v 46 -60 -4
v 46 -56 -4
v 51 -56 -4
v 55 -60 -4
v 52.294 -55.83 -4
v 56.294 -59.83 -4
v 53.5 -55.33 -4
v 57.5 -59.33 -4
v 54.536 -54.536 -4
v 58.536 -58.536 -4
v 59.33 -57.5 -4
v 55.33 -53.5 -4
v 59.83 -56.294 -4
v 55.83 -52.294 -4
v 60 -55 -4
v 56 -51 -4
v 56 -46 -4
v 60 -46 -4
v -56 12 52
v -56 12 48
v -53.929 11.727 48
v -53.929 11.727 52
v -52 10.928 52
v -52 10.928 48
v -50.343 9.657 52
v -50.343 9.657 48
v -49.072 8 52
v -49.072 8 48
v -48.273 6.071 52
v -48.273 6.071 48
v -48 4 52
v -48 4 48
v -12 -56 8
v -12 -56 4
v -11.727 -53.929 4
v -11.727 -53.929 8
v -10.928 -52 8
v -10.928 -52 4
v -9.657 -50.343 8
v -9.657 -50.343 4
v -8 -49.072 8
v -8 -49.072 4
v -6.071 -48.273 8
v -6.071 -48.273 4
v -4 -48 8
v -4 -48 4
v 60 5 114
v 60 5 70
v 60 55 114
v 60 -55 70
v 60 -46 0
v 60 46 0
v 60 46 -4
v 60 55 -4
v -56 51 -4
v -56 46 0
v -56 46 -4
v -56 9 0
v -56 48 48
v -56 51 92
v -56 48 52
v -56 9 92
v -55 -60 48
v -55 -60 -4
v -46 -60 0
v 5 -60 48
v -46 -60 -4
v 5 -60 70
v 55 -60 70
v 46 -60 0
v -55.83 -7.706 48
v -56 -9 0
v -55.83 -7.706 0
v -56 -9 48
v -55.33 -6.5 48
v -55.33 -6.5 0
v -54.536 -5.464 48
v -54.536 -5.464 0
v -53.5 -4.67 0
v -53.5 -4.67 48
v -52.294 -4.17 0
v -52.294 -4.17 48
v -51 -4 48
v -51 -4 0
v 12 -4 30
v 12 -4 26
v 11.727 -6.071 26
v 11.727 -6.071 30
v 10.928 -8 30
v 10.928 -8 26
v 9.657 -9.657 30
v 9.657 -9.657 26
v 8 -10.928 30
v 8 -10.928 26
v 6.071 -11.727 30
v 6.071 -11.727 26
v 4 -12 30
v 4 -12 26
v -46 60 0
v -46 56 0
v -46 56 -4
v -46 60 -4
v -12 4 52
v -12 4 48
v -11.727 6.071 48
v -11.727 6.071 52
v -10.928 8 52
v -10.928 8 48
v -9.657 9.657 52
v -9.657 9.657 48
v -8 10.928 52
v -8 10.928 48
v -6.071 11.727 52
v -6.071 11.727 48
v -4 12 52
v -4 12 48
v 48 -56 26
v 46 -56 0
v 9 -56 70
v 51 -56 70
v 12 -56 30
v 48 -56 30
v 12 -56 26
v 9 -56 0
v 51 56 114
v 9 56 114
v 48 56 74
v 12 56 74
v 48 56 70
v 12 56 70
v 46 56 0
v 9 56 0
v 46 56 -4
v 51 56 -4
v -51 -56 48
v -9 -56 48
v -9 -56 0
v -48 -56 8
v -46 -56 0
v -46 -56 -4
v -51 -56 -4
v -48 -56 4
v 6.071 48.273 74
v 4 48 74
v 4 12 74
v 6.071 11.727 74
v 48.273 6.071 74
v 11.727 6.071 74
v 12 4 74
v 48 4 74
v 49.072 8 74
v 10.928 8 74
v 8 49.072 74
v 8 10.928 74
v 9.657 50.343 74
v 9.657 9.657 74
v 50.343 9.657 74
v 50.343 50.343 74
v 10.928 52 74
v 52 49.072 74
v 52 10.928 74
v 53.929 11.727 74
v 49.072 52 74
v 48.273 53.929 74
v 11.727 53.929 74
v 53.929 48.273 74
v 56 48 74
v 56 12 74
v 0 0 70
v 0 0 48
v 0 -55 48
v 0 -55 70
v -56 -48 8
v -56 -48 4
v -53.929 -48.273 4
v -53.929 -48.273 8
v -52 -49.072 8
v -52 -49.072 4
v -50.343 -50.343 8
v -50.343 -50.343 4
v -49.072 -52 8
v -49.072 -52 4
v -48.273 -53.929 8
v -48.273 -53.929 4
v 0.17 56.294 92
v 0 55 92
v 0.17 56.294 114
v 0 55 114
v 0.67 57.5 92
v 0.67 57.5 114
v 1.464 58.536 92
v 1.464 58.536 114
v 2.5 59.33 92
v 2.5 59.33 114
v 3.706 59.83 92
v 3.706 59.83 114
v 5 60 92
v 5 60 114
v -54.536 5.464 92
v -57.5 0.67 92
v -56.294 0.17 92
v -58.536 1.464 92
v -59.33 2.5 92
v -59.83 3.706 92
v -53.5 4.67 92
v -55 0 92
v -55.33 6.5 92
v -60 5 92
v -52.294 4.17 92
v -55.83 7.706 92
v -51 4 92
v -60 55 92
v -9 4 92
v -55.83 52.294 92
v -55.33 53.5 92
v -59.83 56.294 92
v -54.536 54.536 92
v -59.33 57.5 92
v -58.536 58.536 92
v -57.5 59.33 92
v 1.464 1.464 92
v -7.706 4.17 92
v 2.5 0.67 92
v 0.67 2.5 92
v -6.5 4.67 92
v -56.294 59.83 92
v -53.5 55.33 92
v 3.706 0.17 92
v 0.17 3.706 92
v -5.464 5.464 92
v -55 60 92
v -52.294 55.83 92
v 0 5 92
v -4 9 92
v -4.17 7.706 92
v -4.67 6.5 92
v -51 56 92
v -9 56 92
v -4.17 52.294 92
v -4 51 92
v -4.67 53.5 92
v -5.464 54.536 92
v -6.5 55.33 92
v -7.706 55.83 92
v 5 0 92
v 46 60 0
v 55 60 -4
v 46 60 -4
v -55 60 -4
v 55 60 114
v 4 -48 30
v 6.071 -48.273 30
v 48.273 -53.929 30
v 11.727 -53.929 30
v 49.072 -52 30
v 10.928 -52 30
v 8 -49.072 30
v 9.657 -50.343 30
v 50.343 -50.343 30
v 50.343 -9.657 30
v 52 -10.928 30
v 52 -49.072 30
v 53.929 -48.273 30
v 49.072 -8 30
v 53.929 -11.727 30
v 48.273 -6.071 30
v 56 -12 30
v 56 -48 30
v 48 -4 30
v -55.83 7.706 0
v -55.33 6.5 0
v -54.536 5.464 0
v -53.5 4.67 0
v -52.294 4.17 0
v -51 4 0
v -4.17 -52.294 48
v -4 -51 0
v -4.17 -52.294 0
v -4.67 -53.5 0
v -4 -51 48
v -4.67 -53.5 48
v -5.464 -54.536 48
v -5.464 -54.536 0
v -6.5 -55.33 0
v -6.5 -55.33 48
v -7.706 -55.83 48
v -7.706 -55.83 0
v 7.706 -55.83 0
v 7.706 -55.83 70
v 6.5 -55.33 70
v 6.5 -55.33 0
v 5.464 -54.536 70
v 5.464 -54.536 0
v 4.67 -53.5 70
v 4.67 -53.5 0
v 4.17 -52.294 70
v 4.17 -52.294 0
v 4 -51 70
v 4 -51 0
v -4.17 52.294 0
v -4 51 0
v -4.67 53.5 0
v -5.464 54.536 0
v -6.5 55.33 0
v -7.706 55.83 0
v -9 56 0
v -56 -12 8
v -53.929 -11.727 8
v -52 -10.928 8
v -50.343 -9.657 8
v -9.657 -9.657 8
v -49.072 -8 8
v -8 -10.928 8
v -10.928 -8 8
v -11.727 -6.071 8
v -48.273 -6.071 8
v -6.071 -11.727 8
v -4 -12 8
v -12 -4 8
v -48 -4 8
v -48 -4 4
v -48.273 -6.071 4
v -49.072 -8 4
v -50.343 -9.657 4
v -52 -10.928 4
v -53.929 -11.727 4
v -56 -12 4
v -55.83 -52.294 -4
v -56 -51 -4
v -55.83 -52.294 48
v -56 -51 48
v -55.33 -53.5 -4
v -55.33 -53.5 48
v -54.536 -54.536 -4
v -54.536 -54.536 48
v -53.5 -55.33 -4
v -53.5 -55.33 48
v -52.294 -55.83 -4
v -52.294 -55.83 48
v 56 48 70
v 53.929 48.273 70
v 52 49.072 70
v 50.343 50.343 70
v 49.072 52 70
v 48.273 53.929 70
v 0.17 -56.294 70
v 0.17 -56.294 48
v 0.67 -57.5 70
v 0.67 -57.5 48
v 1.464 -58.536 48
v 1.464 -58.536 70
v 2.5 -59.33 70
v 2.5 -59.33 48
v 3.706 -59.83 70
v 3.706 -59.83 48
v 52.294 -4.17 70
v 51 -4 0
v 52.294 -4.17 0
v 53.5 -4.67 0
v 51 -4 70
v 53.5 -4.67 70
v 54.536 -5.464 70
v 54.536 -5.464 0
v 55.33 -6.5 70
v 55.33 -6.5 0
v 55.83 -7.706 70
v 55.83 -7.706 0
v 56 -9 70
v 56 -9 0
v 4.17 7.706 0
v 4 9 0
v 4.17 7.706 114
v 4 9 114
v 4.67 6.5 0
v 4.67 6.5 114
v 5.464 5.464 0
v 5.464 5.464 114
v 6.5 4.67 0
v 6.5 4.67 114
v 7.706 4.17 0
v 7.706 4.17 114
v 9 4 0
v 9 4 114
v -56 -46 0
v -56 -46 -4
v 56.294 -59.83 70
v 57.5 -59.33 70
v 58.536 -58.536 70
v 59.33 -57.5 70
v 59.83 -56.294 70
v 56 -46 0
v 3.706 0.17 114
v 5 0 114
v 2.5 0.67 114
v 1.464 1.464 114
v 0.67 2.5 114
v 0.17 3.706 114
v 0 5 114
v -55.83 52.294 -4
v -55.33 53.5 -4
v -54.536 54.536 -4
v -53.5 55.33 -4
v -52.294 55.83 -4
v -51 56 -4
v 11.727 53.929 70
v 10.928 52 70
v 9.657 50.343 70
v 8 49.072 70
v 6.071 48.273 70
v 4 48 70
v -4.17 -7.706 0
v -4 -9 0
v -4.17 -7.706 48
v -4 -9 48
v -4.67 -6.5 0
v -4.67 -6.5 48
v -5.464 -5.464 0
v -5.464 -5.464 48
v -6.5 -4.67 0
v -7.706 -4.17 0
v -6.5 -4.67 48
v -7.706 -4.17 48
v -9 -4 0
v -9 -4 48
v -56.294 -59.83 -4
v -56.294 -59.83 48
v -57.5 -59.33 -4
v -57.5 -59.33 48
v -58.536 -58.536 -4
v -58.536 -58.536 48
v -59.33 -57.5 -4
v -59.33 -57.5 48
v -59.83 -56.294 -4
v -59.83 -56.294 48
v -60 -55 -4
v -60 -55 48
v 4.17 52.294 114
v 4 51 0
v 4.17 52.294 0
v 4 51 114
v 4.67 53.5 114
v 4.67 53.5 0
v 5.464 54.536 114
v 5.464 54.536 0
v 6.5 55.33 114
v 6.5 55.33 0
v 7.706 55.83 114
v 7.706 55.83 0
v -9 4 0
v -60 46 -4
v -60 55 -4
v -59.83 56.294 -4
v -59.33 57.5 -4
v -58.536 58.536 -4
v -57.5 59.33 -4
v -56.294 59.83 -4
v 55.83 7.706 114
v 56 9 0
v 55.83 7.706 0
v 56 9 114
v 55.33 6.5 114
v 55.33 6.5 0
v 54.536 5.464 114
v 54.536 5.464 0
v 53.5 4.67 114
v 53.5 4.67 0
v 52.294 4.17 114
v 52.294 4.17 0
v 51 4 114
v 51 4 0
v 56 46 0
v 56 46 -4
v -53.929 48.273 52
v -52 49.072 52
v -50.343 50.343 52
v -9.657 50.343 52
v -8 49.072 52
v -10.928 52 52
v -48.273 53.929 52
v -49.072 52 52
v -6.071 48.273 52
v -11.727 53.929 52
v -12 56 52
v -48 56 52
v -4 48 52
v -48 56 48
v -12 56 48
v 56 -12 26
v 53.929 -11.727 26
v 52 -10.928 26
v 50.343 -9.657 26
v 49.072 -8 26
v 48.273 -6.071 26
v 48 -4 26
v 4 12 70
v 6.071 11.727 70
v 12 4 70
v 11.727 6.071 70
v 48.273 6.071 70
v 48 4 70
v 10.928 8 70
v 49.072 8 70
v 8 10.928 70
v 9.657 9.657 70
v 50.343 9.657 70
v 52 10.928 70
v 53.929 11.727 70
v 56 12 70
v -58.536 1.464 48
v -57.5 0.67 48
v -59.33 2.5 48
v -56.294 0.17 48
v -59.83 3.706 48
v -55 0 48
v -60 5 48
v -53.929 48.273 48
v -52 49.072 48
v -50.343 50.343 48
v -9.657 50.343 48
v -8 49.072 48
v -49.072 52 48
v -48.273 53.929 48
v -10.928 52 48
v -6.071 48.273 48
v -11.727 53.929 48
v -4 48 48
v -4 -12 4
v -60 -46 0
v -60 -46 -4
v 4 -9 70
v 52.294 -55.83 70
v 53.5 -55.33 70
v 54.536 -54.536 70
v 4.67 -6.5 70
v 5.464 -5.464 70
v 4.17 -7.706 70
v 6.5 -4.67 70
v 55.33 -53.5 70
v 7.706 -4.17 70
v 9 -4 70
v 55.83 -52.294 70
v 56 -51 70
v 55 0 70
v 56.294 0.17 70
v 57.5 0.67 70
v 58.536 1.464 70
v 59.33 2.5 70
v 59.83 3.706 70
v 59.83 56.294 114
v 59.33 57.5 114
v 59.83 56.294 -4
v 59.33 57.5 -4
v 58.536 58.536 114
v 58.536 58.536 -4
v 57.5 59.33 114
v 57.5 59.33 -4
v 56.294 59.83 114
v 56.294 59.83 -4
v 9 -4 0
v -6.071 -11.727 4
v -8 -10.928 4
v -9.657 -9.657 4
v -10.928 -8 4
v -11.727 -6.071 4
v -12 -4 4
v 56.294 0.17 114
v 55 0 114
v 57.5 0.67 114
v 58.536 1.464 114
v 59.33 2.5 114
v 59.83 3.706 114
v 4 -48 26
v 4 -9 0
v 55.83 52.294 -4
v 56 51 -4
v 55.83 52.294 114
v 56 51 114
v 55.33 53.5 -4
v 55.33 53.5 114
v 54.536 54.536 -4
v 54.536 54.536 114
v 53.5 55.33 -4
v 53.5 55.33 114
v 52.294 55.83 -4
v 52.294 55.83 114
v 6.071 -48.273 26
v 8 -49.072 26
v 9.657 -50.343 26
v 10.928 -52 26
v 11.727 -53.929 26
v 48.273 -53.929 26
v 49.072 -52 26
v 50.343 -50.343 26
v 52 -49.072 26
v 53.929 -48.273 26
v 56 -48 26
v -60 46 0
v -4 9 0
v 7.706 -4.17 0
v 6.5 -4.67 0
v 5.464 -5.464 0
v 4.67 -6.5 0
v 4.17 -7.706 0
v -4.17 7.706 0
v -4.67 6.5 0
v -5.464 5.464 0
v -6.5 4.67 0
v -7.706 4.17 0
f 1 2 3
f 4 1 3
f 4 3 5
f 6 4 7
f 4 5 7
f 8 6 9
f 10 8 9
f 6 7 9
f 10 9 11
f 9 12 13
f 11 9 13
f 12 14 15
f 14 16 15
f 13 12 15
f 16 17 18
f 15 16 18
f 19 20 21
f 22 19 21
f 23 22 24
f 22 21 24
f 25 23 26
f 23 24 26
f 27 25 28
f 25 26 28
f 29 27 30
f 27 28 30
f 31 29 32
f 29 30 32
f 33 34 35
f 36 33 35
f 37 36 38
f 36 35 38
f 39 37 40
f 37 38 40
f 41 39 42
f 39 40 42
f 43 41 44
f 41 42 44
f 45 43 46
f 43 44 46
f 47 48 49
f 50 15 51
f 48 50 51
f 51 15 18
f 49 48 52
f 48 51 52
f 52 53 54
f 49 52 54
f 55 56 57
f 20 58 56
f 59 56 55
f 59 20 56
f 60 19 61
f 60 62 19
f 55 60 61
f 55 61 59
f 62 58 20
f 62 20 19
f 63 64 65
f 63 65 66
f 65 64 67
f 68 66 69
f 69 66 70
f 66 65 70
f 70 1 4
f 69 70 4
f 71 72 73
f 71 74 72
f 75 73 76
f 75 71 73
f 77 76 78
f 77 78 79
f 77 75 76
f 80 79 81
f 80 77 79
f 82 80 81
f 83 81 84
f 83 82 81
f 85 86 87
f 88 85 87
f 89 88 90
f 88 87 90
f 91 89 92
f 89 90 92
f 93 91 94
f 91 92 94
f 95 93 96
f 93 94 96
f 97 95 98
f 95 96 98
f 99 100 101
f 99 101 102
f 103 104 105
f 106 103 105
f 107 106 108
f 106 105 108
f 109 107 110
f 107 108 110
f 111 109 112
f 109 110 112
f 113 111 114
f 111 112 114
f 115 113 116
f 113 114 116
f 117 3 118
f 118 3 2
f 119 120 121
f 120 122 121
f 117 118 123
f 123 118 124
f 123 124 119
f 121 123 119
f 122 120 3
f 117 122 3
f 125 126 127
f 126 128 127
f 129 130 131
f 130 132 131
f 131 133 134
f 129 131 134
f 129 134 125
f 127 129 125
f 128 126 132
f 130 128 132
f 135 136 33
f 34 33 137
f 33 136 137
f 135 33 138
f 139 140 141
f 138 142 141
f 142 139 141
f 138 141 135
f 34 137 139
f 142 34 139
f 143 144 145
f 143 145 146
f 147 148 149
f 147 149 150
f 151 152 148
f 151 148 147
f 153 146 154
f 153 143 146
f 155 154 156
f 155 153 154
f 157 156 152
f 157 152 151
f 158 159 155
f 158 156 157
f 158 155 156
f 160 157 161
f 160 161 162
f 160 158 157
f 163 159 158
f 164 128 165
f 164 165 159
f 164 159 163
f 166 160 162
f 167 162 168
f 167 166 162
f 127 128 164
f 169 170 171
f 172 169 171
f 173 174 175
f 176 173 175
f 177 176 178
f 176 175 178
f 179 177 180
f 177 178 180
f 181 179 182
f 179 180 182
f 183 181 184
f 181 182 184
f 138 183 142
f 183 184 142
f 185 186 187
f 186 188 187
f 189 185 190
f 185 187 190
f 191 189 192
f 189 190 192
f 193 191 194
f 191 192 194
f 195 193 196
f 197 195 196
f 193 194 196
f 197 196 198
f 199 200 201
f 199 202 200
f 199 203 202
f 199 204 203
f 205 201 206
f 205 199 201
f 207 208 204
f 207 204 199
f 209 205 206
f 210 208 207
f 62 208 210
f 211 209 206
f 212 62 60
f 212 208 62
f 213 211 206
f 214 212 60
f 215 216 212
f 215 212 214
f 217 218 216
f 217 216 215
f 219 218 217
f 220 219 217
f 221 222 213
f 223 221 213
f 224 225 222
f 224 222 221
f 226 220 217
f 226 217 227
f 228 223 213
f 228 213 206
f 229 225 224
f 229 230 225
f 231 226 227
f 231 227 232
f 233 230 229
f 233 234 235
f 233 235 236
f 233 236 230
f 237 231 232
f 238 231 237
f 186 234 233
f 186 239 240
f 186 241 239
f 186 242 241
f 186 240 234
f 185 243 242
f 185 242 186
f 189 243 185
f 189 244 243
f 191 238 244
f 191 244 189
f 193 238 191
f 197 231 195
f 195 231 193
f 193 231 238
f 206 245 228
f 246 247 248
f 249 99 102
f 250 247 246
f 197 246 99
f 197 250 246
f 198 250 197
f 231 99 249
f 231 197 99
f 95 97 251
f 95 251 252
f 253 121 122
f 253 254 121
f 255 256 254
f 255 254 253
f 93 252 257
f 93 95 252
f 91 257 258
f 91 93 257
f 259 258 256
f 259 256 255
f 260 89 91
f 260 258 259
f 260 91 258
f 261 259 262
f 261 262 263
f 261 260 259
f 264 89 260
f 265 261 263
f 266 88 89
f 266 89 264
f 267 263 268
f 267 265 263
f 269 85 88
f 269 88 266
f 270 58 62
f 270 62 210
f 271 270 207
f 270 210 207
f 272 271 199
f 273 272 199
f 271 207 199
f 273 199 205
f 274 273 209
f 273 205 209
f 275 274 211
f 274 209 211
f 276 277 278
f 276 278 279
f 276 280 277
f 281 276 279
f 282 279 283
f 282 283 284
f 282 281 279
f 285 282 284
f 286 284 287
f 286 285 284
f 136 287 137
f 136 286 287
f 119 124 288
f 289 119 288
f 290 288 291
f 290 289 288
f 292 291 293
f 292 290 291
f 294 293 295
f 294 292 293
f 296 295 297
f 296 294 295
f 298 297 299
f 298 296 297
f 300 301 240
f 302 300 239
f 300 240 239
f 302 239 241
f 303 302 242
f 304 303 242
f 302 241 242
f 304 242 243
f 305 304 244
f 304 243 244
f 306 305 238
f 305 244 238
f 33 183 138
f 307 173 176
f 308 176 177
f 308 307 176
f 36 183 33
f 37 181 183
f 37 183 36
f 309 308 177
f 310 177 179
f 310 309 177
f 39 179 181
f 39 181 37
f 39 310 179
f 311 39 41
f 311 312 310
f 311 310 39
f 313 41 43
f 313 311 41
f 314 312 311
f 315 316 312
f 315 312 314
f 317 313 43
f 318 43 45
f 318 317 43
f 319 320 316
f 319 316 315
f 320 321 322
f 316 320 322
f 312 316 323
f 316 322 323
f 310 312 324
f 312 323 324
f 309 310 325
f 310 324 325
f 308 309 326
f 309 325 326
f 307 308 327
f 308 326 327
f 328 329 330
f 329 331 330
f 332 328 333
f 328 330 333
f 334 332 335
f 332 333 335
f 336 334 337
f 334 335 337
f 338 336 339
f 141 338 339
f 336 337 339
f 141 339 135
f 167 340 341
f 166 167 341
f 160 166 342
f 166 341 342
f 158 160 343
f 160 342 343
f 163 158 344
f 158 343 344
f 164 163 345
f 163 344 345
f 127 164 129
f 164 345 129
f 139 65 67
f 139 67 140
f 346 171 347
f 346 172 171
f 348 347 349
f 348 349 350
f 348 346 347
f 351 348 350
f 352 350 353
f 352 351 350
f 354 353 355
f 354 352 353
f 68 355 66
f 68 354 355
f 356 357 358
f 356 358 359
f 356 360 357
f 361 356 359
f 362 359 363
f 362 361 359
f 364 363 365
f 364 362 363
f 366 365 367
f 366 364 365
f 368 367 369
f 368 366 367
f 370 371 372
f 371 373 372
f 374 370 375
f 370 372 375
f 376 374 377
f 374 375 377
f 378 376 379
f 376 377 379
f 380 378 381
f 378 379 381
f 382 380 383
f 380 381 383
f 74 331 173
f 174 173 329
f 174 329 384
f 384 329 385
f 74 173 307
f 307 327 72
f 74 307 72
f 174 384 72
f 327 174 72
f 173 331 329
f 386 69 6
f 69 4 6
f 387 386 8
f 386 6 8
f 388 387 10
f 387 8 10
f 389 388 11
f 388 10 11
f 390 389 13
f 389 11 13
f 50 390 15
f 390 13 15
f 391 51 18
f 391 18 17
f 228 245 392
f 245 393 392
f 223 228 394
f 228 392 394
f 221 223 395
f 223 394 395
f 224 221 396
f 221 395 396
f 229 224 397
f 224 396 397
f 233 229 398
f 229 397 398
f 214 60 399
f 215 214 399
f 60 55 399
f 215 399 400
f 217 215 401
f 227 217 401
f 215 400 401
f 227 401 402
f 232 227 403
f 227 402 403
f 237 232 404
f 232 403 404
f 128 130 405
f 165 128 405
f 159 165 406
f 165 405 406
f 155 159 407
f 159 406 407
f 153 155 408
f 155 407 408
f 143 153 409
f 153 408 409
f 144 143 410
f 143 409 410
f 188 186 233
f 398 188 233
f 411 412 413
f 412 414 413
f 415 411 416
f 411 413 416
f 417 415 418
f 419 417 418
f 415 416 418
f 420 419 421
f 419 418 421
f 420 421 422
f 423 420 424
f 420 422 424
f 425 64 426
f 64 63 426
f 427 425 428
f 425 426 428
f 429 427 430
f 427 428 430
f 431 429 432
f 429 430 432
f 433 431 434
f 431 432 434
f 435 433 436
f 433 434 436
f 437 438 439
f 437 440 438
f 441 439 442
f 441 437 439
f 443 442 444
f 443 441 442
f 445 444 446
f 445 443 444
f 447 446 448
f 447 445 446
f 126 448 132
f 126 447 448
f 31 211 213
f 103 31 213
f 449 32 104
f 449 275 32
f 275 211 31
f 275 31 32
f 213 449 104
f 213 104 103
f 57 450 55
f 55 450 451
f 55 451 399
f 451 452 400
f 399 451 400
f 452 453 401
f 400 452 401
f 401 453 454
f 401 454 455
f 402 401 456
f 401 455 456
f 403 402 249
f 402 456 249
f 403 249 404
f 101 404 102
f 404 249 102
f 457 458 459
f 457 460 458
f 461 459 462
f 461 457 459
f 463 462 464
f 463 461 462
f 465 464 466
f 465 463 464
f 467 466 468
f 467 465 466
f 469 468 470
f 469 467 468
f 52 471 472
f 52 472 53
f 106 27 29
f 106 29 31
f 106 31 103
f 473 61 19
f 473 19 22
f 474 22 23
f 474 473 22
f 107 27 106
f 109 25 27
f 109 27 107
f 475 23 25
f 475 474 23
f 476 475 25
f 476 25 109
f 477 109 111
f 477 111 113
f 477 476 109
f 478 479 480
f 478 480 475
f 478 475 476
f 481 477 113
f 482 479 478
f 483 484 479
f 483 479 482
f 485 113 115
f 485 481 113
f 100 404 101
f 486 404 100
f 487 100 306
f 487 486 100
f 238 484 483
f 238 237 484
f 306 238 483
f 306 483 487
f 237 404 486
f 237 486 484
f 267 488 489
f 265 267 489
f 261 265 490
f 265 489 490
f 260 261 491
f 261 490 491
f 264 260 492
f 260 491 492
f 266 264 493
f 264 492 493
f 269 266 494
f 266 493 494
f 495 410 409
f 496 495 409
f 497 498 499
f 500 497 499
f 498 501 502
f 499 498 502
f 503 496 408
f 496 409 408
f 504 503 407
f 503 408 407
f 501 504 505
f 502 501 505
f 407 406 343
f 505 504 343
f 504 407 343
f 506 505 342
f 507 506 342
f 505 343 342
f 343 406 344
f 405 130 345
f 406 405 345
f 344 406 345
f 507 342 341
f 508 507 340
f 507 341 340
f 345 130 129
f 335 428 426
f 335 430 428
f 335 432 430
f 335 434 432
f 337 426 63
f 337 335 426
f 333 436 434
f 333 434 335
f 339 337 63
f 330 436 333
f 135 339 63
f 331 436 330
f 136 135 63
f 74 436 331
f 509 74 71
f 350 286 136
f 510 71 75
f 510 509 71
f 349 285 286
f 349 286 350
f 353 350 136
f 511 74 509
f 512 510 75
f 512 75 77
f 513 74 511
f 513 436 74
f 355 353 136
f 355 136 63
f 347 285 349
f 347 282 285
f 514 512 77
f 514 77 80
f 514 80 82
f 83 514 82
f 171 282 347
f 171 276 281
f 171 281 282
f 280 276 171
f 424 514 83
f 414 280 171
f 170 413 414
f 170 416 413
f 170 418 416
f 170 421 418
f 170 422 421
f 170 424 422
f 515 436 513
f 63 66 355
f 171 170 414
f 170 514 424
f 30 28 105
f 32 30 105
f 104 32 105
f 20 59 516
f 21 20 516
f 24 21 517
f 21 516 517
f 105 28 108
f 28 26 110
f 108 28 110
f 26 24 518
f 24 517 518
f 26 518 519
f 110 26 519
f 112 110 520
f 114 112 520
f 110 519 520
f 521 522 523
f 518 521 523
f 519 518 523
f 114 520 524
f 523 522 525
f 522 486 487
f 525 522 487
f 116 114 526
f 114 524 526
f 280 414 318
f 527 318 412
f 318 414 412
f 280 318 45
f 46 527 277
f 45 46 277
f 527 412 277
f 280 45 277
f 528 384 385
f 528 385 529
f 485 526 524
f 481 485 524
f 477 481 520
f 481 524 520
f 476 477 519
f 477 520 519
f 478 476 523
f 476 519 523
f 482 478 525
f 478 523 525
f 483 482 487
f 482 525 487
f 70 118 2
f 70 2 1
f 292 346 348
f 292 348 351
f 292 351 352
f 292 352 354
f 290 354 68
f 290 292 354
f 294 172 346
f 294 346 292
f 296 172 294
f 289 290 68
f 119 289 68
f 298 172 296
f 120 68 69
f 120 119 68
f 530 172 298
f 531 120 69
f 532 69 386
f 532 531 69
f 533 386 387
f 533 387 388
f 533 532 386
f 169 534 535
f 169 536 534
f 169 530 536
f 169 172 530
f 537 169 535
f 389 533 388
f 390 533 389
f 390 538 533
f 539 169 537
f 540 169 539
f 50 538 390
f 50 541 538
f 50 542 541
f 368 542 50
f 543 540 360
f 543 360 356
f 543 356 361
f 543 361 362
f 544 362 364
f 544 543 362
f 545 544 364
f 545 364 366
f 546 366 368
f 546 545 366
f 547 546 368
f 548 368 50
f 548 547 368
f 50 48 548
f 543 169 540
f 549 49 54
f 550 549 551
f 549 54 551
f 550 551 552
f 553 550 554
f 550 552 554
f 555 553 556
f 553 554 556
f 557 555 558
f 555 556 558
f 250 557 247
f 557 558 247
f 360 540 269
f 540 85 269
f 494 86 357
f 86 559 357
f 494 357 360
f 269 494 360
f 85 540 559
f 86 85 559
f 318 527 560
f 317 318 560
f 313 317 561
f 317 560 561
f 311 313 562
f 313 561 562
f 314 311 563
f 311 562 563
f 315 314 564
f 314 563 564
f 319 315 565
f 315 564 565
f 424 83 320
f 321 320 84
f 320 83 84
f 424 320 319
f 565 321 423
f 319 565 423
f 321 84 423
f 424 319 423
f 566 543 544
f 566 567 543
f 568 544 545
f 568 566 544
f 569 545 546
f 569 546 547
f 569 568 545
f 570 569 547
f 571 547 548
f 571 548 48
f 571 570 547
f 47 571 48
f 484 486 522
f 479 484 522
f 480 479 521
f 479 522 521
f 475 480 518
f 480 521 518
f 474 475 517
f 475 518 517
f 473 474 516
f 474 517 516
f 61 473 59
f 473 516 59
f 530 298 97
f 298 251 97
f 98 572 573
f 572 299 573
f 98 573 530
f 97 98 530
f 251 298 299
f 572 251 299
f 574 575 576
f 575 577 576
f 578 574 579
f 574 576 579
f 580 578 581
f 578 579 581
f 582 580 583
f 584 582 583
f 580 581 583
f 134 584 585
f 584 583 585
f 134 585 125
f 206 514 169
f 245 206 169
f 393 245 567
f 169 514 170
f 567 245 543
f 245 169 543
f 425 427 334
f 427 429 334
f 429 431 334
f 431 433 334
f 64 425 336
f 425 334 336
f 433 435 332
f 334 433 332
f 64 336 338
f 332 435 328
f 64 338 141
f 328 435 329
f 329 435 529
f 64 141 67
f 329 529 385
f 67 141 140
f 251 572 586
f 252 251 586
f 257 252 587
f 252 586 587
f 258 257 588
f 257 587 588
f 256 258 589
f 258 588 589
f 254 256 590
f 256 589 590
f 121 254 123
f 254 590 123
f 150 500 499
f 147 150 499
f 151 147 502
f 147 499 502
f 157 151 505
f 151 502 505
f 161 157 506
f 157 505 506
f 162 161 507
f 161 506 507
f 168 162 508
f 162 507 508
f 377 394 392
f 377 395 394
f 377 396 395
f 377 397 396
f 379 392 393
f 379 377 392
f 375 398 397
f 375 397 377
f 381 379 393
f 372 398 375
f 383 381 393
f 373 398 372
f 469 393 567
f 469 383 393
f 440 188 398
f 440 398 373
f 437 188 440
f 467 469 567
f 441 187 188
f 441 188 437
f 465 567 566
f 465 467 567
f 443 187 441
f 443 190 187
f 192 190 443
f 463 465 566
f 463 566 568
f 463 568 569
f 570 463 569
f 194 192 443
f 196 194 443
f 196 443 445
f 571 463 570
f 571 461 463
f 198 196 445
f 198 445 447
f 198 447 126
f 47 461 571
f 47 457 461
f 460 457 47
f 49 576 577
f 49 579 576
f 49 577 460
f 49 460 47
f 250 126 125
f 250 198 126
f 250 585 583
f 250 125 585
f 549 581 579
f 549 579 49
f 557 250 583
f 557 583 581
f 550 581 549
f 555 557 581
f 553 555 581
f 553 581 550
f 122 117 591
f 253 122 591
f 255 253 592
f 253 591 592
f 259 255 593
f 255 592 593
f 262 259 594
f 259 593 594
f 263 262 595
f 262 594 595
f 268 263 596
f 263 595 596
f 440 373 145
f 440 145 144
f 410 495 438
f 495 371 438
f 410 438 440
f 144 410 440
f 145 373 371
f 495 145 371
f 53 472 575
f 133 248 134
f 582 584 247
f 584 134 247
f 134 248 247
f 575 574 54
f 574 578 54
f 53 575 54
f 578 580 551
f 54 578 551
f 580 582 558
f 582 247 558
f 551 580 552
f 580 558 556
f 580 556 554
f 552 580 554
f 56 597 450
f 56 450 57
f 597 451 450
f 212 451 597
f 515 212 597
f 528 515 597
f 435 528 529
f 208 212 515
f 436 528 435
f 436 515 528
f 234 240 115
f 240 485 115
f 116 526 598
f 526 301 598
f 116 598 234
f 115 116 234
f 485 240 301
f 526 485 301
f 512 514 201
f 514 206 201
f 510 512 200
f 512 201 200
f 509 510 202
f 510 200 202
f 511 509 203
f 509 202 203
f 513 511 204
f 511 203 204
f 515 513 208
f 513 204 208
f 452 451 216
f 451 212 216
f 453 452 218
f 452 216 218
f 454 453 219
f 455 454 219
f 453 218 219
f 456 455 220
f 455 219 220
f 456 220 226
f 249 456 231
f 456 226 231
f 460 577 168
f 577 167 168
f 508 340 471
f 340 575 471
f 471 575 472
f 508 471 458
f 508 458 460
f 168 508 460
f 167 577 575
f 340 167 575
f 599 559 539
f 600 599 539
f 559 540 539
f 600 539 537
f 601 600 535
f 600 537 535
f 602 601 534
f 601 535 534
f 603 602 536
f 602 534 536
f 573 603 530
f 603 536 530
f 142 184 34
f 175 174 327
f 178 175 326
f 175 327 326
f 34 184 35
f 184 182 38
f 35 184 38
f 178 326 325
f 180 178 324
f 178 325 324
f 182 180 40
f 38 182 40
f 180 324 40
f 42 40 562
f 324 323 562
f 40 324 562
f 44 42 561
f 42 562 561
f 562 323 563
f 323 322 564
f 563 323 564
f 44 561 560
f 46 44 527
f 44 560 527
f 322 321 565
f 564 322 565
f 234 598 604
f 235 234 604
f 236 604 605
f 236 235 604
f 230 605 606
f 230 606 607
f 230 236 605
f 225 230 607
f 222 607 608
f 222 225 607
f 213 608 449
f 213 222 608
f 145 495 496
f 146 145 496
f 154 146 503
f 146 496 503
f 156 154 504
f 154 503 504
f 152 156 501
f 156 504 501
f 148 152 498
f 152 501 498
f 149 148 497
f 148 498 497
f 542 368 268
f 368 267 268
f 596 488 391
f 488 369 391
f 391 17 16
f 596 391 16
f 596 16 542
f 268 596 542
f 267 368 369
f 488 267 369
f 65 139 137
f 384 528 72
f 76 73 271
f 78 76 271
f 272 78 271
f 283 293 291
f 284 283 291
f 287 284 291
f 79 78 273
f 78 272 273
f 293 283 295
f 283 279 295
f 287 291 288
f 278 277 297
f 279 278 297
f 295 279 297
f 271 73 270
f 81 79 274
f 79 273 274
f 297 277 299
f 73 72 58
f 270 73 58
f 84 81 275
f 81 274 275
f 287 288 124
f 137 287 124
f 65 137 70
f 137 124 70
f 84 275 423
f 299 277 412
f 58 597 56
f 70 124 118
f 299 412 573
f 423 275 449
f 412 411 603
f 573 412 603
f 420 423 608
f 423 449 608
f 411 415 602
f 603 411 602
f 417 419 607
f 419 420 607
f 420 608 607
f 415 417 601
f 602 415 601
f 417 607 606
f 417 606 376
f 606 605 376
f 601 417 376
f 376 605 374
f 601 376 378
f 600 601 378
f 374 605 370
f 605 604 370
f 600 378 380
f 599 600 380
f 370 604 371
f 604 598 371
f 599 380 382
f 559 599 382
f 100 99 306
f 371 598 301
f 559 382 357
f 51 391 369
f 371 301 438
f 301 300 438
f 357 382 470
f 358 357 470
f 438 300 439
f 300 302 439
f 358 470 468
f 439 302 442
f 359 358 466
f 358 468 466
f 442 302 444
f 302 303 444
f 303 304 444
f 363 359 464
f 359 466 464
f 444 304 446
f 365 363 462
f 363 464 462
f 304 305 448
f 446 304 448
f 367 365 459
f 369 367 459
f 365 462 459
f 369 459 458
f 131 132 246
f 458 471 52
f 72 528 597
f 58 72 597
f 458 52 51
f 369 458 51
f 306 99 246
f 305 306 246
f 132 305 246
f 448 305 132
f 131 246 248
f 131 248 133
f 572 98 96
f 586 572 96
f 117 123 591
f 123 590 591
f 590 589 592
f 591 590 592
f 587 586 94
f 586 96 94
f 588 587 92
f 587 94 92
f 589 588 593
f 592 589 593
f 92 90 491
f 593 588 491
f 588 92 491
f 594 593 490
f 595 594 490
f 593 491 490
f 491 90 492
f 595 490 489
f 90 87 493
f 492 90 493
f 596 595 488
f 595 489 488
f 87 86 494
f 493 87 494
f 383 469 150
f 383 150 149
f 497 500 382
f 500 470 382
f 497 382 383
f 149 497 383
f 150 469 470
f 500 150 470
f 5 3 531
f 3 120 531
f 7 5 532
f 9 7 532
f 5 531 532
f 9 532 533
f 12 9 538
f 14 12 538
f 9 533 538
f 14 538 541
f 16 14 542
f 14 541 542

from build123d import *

# Parameters (mm, degrees)
F0_W      = 4
F0_H      = 4
F1_DEPTH  = 48
F2_DEPTH  = 8
F3_DEPTH  = 70
F4_DEPTH  = 30
F0_H_2    = 23.163830772
F5_DEPTH  = 114
F6_DEPTH  = 74
F0_W_2    = 10.0586636961
F7_DEPTH  = 92
F8_DEPTH  = 52
F9_DEPTH  = 4
F10_DEPTH = 48
F11_DEPTH = 26
F12_DEPTH = 70
F13_DEPTH = 4
F14_R     = 5


with BuildPart() as f1:
    # F0 (on Top) → F1 (new body)
    with BuildSketch(Plane.XY):
        Polygon((-12, -4), (-4, -4), (-4, 0), (-56, 0), (-56, -4), (-48, -4), align=None)
        Polygon((-60, -56), (-56, -56), (-56, -48), (-56, -46), (-60, -46), align=None)
        Polygon((-4, -56), (0, -56), (0, -4), (-4, -4), (-4, -12), (-4, -48), align=None)
        with Locations((-2, -2)):
            Rectangle(F0_W, F0_H)
        Polygon((-60, 0), (-60, -46), (-56, -46), (-56, -16.2410065532), (-56, -12), (-56, -4), (-56, 0), align=None)
        Polygon((-46, -60), (0, -60), (0, -56), (-4, -56), (-12, -56), (-46, -56), align=None)
        Polygon((-56, -60), (-46, -60), (-46, -56), (-48, -56), (-56, -56), align=None)
        with Locations((-58, -58)):
            Rectangle(F0_W, F0_H)
    extrude(amount=F1_DEPTH)

    # F0 (on Top) → F2 (join)
    with BuildSketch(Plane.XY):
        with BuildLine():
            Line((-48, -56), (-46, -56))
            Line((-46, -56), (-12, -56))
            ThreePointArc((-12, -56), (-9.6568542495, -50.3431457505), (-4, -48))
            Line((-4, -48), (-4, -12))
            ThreePointArc((-4, -12), (-9.6568542495, -9.6568542495), (-12, -4))
            Line((-12, -4), (-48, -4))
            ThreePointArc((-48, -4), (-50.3431457505, -9.6568542495), (-56, -12))
            Line((-56, -12), (-56, -16.2410065532))
            Line((-56, -16.2410065532), (-56, -46))
            Line((-56, -46), (-56, -48))
            ThreePointArc((-56, -48), (-50.3431457505, -50.3431457505), (-48, -56))
        make_face()
    extrude(amount=F2_DEPTH)

    # F0 (on Top) → F3 (join)
    with BuildSketch(Plane.XY):
        Polygon((0, -4), (0, -56), (4, -56), (4, -48), (4, -12), (4, -4), align=None)
        with Locations((2, -2)):
            Rectangle(F0_W, F0_H)
        Polygon((56, -4), (56, 0), (4, 0), (4, -4), (12, -4), (48, -4), align=None)
        Polygon((56, -46), (60, -46), (60, 0), (56, 0), (56, -4), (56, -12), align=None)
        Polygon((0, -60), (46, -60), (46, -56), (12, -56), (4, -56), (0, -56), align=None)
        Polygon((56, -56), (60, -56), (60, -46), (56, -46), (56, -48), align=None)
        with Locations((58, -58)):
            Rectangle(F0_W, F0_H)
        Polygon((46, -60), (56, -60), (56, -56), (48, -56), (46, -56), align=None)
    extrude(amount=F3_DEPTH)

    # F0 (on Top) → F4 (join)
    with BuildSketch(Plane.XY):
        with BuildLine():
            Line((12, -56), (46, -56))
            Line((46, -56), (48, -56))
            ThreePointArc((48, -56), (50.3431457505, -50.3431457505), (56, -48))
            Line((56, -48), (56, -46))
            Line((56, -46), (56, -12))
            ThreePointArc((56, -12), (50.3431457505, -9.6568542495), (48, -4))
            Line((48, -4), (12, -4))
            ThreePointArc((12, -4), (9.6568542495, -9.6568542495), (4, -12))
            Line((4, -12), (4, -48))
            ThreePointArc((4, -48), (9.6568542495, -50.3431457505), (12, -56))
        make_face()
    extrude(amount=F4_DEPTH)

    # F0 (on Top) → F5 (join)
    with BuildSketch(Plane.XY):
        Polygon((0, 4), (4, 4), (4, 12), (4, 48), (4, 56), (0, 56), align=None)
        Polygon((0, 60), (0, 56), (4, 56), (12, 56), (46, 56), (46, 60), align=None)
        with Locations((58, 34.418084614)):
            Rectangle(F0_W, F0_H_2)
        Polygon((56, 0), (60, 0), (60, 22.836169228), (56, 22.836169228), (56, 12), (56, 4), align=None)
        Polygon((4, 0), (56, 0), (56, 4), (48, 4), (12, 4), (4, 4), align=None)
        with Locations((2, 2)):
            Rectangle(F0_W, F0_H)
        Polygon((48, 56), (56, 56), (56, 60), (46, 60), (46, 56), align=None)
        with Locations((58, 58)):
            Rectangle(F0_W, F0_H)
        Polygon((56, 46), (60, 46), (60, 56), (56, 56), (56, 48), align=None)
    extrude(amount=F5_DEPTH)

    # F0 (on Top) → F6 (join)
    with BuildSketch(Plane.XY):
        with BuildLine():
            Line((56, 12), (56, 22.836169228))
            Line((56, 22.836169228), (56, 46))
            Line((56, 46), (56, 48))
            ThreePointArc((56, 48), (50.3431457505, 50.3431457505), (48, 56))
            Line((48, 56), (46, 56))
            Line((46, 56), (12, 56))
            ThreePointArc((12, 56), (9.6568542495, 50.3431457505), (4, 48))
            Line((4, 48), (4, 12))
            ThreePointArc((4, 12), (9.6568542495, 9.6568542495), (12, 4))
            Line((12, 4), (48, 4))
            ThreePointArc((48, 4), (50.3431457505, 9.6568542495), (56, 12))
        make_face()
    extrude(amount=F6_DEPTH)

    # F0 (on Top) → F7 (join)
    with BuildSketch(Plane.XY):
        Polygon((-56, 0), (-4, 0), (-4, 4), (-12, 4), (-48, 4), (-56, 4), align=None)
        Polygon((-4, 4), (0, 4), (0, 56), (-4, 56), (-4, 48), (-4, 12), align=None)
        with Locations((-2, 2)):
            Rectangle(F0_W, F0_H)
        Polygon((-4, 56), (0, 56), (0, 60), (-35.9413363039, 60), (-35.9413363039, 56), (-12, 56), align=None)
        with Locations((-40.970668152, 58)):
            Rectangle(F0_W_2, F0_H)
        Polygon((-60, 0), (-56, 0), (-56, 4), (-56, 12), (-56, 46), (-60, 46), align=None)
        Polygon((-46, 56), (-46, 60), (-56, 60), (-56, 56), (-48, 56), align=None)
        with Locations((-58, 58)):
            Rectangle(F0_W, F0_H)
        Polygon((-60, 56), (-60, 46), (-56, 46), (-56, 48), (-56, 56), align=None)
    extrude(amount=F7_DEPTH)

    # F0 (on Top) → F8 (join)
    with BuildSketch(Plane.XY):
        with BuildLine():
            ThreePointArc((-12, 4), (-9.6568542495, 9.6568542495), (-4, 12))
            Line((-4, 12), (-4, 48))
            ThreePointArc((-4, 48), (-9.6568542495, 50.3431457505), (-12, 56))
            Line((-12, 56), (-35.9413363039, 56))
            Line((-35.9413363039, 56), (-46, 56))
            Line((-46, 56), (-48, 56))
            ThreePointArc((-48, 56), (-50.3431457505, 50.3431457505), (-56, 48))
            Line((-56, 48), (-56, 46))
            Line((-56, 46), (-56, 12))
            ThreePointArc((-56, 12), (-50.3431457505, 9.6568542495), (-48, 4))
            Line((-48, 4), (-12, 4))
        make_face()
    extrude(amount=F8_DEPTH)

    # F0 (on Top) → F9 (cut)
    with BuildSketch(Plane.XY):
        with BuildLine():
            Line((-48, -56), (-46, -56))
            Line((-46, -56), (-12, -56))
            ThreePointArc((-12, -56), (-9.6568542495, -50.3431457505), (-4, -48))
            Line((-4, -48), (-4, -12))
            ThreePointArc((-4, -12), (-9.6568542495, -9.6568542495), (-12, -4))
            Line((-12, -4), (-48, -4))
            ThreePointArc((-48, -4), (-50.3431457505, -9.6568542495), (-56, -12))
            Line((-56, -12), (-56, -16.2410065532))
            Line((-56, -16.2410065532), (-56, -46))
            Line((-56, -46), (-56, -48))
            ThreePointArc((-56, -48), (-50.3431457505, -50.3431457505), (-48, -56))
        make_face()
    extrude(amount=F9_DEPTH, mode=Mode.SUBTRACT)

    # F0 (on Top) → F10 (cut)
    with BuildSketch(Plane.XY):
        with BuildLine():
            ThreePointArc((-12, 4), (-9.6568542495, 9.6568542495), (-4, 12))
            Line((-4, 12), (-4, 48))
            ThreePointArc((-4, 48), (-9.6568542495, 50.3431457505), (-12, 56))
            Line((-12, 56), (-35.9413363039, 56))
            Line((-35.9413363039, 56), (-46, 56))
            Line((-46, 56), (-48, 56))
            ThreePointArc((-48, 56), (-50.3431457505, 50.3431457505), (-56, 48))
            Line((-56, 48), (-56, 46))
            Line((-56, 46), (-56, 12))
            ThreePointArc((-56, 12), (-50.3431457505, 9.6568542495), (-48, 4))
            Line((-48, 4), (-12, 4))
        make_face()
    extrude(amount=F10_DEPTH, mode=Mode.SUBTRACT)

    # F0 (on Top) → F11 (cut)
    with BuildSketch(Plane.XY):
        with BuildLine():
            Line((12, -56), (46, -56))
            Line((46, -56), (48, -56))
            ThreePointArc((48, -56), (50.3431457505, -50.3431457505), (56, -48))
            Line((56, -48), (56, -46))
            Line((56, -46), (56, -12))
            ThreePointArc((56, -12), (50.3431457505, -9.6568542495), (48, -4))
            Line((48, -4), (12, -4))
            ThreePointArc((12, -4), (9.6568542495, -9.6568542495), (4, -12))
            Line((4, -12), (4, -48))
            ThreePointArc((4, -48), (9.6568542495, -50.3431457505), (12, -56))
        make_face()
    extrude(amount=F11_DEPTH, mode=Mode.SUBTRACT)

    # F0 (on Top) → F12 (cut)
    with BuildSketch(Plane.XY):
        with BuildLine():
            Line((56, 12), (56, 22.836169228))
            Line((56, 22.836169228), (56, 46))
            Line((56, 46), (56, 48))
            ThreePointArc((56, 48), (50.3431457505, 50.3431457505), (48, 56))
            Line((48, 56), (46, 56))
            Line((46, 56), (12, 56))
            ThreePointArc((12, 56), (9.6568542495, 50.3431457505), (4, 48))
            Line((4, 48), (4, 12))
            ThreePointArc((4, 12), (9.6568542495, 9.6568542495), (12, 4))
            Line((12, 4), (48, 4))
            ThreePointArc((48, 4), (50.3431457505, 9.6568542495), (56, 12))
        make_face()
    extrude(amount=F12_DEPTH, mode=Mode.SUBTRACT)

    # F0 (on Top) → F13 (join)
    with BuildSketch(Plane.XY):
        Polygon((-46, 56), (-46, 60), (-56, 60), (-56, 56), (-48, 56), align=None)
        with Locations((-58, 58)):
            Rectangle(F0_W, F0_H)
        Polygon((-60, 56), (-60, 46), (-56, 46), (-56, 48), (-56, 56), align=None)
        Polygon((48, 56), (56, 56), (56, 60), (46, 60), (46, 56), align=None)
        with Locations((58, 58)):
            Rectangle(F0_W, F0_H)
        Polygon((56, 46), (60, 46), (60, 56), (56, 56), (56, 48), align=None)
        Polygon((56, -56), (60, -56), (60, -46), (56, -46), (56, -48), align=None)
        Polygon((46, -60), (56, -60), (56, -56), (48, -56), (46, -56), align=None)
        with Locations((58, -58)):
            Rectangle(F0_W, F0_H)
        Polygon((-60, -56), (-56, -56), (-56, -48), (-56, -46), (-60, -46), align=None)
        with Locations((-58, -58)):
            Rectangle(F0_W, F0_H)
        Polygon((-56, -60), (-46, -60), (-46, -56), (-48, -56), (-56, -56), align=None)
    extrude(amount=-F13_DEPTH)

    # F14
    f14_edges = [f1.edges().sort_by_distance(p)[0] for p in [
        (-60, 60, 44),
        (-60, 0, 70),
        (-60, -60, 22),
        (60, -60, 33),
        (0, -60, 59),
        (60, 60, 55),
        (0, 60, 103),
        (0, 0, 103),
        (60, 0, 92),
        (-4, 56, 46),
        (-4, 4, 46),
        (-56, 56, 44),
        (-56, 4, 46),
        (-56, -4, 24),
        (-4, -4, 24),
        (-4, -56, 24),
        (-56, -56, 22),
        (4, -56, 35),
        (4, -4, 35),
        (56, -4, 35),
        (56, -56, 33),
        (56, 4, 57),
        (56, 56, 55),
        (4, 56, 57),
        (4, 4, 57),
    ]]
    fillet(f14_edges, radius=F14_R)


solid = f1.part
